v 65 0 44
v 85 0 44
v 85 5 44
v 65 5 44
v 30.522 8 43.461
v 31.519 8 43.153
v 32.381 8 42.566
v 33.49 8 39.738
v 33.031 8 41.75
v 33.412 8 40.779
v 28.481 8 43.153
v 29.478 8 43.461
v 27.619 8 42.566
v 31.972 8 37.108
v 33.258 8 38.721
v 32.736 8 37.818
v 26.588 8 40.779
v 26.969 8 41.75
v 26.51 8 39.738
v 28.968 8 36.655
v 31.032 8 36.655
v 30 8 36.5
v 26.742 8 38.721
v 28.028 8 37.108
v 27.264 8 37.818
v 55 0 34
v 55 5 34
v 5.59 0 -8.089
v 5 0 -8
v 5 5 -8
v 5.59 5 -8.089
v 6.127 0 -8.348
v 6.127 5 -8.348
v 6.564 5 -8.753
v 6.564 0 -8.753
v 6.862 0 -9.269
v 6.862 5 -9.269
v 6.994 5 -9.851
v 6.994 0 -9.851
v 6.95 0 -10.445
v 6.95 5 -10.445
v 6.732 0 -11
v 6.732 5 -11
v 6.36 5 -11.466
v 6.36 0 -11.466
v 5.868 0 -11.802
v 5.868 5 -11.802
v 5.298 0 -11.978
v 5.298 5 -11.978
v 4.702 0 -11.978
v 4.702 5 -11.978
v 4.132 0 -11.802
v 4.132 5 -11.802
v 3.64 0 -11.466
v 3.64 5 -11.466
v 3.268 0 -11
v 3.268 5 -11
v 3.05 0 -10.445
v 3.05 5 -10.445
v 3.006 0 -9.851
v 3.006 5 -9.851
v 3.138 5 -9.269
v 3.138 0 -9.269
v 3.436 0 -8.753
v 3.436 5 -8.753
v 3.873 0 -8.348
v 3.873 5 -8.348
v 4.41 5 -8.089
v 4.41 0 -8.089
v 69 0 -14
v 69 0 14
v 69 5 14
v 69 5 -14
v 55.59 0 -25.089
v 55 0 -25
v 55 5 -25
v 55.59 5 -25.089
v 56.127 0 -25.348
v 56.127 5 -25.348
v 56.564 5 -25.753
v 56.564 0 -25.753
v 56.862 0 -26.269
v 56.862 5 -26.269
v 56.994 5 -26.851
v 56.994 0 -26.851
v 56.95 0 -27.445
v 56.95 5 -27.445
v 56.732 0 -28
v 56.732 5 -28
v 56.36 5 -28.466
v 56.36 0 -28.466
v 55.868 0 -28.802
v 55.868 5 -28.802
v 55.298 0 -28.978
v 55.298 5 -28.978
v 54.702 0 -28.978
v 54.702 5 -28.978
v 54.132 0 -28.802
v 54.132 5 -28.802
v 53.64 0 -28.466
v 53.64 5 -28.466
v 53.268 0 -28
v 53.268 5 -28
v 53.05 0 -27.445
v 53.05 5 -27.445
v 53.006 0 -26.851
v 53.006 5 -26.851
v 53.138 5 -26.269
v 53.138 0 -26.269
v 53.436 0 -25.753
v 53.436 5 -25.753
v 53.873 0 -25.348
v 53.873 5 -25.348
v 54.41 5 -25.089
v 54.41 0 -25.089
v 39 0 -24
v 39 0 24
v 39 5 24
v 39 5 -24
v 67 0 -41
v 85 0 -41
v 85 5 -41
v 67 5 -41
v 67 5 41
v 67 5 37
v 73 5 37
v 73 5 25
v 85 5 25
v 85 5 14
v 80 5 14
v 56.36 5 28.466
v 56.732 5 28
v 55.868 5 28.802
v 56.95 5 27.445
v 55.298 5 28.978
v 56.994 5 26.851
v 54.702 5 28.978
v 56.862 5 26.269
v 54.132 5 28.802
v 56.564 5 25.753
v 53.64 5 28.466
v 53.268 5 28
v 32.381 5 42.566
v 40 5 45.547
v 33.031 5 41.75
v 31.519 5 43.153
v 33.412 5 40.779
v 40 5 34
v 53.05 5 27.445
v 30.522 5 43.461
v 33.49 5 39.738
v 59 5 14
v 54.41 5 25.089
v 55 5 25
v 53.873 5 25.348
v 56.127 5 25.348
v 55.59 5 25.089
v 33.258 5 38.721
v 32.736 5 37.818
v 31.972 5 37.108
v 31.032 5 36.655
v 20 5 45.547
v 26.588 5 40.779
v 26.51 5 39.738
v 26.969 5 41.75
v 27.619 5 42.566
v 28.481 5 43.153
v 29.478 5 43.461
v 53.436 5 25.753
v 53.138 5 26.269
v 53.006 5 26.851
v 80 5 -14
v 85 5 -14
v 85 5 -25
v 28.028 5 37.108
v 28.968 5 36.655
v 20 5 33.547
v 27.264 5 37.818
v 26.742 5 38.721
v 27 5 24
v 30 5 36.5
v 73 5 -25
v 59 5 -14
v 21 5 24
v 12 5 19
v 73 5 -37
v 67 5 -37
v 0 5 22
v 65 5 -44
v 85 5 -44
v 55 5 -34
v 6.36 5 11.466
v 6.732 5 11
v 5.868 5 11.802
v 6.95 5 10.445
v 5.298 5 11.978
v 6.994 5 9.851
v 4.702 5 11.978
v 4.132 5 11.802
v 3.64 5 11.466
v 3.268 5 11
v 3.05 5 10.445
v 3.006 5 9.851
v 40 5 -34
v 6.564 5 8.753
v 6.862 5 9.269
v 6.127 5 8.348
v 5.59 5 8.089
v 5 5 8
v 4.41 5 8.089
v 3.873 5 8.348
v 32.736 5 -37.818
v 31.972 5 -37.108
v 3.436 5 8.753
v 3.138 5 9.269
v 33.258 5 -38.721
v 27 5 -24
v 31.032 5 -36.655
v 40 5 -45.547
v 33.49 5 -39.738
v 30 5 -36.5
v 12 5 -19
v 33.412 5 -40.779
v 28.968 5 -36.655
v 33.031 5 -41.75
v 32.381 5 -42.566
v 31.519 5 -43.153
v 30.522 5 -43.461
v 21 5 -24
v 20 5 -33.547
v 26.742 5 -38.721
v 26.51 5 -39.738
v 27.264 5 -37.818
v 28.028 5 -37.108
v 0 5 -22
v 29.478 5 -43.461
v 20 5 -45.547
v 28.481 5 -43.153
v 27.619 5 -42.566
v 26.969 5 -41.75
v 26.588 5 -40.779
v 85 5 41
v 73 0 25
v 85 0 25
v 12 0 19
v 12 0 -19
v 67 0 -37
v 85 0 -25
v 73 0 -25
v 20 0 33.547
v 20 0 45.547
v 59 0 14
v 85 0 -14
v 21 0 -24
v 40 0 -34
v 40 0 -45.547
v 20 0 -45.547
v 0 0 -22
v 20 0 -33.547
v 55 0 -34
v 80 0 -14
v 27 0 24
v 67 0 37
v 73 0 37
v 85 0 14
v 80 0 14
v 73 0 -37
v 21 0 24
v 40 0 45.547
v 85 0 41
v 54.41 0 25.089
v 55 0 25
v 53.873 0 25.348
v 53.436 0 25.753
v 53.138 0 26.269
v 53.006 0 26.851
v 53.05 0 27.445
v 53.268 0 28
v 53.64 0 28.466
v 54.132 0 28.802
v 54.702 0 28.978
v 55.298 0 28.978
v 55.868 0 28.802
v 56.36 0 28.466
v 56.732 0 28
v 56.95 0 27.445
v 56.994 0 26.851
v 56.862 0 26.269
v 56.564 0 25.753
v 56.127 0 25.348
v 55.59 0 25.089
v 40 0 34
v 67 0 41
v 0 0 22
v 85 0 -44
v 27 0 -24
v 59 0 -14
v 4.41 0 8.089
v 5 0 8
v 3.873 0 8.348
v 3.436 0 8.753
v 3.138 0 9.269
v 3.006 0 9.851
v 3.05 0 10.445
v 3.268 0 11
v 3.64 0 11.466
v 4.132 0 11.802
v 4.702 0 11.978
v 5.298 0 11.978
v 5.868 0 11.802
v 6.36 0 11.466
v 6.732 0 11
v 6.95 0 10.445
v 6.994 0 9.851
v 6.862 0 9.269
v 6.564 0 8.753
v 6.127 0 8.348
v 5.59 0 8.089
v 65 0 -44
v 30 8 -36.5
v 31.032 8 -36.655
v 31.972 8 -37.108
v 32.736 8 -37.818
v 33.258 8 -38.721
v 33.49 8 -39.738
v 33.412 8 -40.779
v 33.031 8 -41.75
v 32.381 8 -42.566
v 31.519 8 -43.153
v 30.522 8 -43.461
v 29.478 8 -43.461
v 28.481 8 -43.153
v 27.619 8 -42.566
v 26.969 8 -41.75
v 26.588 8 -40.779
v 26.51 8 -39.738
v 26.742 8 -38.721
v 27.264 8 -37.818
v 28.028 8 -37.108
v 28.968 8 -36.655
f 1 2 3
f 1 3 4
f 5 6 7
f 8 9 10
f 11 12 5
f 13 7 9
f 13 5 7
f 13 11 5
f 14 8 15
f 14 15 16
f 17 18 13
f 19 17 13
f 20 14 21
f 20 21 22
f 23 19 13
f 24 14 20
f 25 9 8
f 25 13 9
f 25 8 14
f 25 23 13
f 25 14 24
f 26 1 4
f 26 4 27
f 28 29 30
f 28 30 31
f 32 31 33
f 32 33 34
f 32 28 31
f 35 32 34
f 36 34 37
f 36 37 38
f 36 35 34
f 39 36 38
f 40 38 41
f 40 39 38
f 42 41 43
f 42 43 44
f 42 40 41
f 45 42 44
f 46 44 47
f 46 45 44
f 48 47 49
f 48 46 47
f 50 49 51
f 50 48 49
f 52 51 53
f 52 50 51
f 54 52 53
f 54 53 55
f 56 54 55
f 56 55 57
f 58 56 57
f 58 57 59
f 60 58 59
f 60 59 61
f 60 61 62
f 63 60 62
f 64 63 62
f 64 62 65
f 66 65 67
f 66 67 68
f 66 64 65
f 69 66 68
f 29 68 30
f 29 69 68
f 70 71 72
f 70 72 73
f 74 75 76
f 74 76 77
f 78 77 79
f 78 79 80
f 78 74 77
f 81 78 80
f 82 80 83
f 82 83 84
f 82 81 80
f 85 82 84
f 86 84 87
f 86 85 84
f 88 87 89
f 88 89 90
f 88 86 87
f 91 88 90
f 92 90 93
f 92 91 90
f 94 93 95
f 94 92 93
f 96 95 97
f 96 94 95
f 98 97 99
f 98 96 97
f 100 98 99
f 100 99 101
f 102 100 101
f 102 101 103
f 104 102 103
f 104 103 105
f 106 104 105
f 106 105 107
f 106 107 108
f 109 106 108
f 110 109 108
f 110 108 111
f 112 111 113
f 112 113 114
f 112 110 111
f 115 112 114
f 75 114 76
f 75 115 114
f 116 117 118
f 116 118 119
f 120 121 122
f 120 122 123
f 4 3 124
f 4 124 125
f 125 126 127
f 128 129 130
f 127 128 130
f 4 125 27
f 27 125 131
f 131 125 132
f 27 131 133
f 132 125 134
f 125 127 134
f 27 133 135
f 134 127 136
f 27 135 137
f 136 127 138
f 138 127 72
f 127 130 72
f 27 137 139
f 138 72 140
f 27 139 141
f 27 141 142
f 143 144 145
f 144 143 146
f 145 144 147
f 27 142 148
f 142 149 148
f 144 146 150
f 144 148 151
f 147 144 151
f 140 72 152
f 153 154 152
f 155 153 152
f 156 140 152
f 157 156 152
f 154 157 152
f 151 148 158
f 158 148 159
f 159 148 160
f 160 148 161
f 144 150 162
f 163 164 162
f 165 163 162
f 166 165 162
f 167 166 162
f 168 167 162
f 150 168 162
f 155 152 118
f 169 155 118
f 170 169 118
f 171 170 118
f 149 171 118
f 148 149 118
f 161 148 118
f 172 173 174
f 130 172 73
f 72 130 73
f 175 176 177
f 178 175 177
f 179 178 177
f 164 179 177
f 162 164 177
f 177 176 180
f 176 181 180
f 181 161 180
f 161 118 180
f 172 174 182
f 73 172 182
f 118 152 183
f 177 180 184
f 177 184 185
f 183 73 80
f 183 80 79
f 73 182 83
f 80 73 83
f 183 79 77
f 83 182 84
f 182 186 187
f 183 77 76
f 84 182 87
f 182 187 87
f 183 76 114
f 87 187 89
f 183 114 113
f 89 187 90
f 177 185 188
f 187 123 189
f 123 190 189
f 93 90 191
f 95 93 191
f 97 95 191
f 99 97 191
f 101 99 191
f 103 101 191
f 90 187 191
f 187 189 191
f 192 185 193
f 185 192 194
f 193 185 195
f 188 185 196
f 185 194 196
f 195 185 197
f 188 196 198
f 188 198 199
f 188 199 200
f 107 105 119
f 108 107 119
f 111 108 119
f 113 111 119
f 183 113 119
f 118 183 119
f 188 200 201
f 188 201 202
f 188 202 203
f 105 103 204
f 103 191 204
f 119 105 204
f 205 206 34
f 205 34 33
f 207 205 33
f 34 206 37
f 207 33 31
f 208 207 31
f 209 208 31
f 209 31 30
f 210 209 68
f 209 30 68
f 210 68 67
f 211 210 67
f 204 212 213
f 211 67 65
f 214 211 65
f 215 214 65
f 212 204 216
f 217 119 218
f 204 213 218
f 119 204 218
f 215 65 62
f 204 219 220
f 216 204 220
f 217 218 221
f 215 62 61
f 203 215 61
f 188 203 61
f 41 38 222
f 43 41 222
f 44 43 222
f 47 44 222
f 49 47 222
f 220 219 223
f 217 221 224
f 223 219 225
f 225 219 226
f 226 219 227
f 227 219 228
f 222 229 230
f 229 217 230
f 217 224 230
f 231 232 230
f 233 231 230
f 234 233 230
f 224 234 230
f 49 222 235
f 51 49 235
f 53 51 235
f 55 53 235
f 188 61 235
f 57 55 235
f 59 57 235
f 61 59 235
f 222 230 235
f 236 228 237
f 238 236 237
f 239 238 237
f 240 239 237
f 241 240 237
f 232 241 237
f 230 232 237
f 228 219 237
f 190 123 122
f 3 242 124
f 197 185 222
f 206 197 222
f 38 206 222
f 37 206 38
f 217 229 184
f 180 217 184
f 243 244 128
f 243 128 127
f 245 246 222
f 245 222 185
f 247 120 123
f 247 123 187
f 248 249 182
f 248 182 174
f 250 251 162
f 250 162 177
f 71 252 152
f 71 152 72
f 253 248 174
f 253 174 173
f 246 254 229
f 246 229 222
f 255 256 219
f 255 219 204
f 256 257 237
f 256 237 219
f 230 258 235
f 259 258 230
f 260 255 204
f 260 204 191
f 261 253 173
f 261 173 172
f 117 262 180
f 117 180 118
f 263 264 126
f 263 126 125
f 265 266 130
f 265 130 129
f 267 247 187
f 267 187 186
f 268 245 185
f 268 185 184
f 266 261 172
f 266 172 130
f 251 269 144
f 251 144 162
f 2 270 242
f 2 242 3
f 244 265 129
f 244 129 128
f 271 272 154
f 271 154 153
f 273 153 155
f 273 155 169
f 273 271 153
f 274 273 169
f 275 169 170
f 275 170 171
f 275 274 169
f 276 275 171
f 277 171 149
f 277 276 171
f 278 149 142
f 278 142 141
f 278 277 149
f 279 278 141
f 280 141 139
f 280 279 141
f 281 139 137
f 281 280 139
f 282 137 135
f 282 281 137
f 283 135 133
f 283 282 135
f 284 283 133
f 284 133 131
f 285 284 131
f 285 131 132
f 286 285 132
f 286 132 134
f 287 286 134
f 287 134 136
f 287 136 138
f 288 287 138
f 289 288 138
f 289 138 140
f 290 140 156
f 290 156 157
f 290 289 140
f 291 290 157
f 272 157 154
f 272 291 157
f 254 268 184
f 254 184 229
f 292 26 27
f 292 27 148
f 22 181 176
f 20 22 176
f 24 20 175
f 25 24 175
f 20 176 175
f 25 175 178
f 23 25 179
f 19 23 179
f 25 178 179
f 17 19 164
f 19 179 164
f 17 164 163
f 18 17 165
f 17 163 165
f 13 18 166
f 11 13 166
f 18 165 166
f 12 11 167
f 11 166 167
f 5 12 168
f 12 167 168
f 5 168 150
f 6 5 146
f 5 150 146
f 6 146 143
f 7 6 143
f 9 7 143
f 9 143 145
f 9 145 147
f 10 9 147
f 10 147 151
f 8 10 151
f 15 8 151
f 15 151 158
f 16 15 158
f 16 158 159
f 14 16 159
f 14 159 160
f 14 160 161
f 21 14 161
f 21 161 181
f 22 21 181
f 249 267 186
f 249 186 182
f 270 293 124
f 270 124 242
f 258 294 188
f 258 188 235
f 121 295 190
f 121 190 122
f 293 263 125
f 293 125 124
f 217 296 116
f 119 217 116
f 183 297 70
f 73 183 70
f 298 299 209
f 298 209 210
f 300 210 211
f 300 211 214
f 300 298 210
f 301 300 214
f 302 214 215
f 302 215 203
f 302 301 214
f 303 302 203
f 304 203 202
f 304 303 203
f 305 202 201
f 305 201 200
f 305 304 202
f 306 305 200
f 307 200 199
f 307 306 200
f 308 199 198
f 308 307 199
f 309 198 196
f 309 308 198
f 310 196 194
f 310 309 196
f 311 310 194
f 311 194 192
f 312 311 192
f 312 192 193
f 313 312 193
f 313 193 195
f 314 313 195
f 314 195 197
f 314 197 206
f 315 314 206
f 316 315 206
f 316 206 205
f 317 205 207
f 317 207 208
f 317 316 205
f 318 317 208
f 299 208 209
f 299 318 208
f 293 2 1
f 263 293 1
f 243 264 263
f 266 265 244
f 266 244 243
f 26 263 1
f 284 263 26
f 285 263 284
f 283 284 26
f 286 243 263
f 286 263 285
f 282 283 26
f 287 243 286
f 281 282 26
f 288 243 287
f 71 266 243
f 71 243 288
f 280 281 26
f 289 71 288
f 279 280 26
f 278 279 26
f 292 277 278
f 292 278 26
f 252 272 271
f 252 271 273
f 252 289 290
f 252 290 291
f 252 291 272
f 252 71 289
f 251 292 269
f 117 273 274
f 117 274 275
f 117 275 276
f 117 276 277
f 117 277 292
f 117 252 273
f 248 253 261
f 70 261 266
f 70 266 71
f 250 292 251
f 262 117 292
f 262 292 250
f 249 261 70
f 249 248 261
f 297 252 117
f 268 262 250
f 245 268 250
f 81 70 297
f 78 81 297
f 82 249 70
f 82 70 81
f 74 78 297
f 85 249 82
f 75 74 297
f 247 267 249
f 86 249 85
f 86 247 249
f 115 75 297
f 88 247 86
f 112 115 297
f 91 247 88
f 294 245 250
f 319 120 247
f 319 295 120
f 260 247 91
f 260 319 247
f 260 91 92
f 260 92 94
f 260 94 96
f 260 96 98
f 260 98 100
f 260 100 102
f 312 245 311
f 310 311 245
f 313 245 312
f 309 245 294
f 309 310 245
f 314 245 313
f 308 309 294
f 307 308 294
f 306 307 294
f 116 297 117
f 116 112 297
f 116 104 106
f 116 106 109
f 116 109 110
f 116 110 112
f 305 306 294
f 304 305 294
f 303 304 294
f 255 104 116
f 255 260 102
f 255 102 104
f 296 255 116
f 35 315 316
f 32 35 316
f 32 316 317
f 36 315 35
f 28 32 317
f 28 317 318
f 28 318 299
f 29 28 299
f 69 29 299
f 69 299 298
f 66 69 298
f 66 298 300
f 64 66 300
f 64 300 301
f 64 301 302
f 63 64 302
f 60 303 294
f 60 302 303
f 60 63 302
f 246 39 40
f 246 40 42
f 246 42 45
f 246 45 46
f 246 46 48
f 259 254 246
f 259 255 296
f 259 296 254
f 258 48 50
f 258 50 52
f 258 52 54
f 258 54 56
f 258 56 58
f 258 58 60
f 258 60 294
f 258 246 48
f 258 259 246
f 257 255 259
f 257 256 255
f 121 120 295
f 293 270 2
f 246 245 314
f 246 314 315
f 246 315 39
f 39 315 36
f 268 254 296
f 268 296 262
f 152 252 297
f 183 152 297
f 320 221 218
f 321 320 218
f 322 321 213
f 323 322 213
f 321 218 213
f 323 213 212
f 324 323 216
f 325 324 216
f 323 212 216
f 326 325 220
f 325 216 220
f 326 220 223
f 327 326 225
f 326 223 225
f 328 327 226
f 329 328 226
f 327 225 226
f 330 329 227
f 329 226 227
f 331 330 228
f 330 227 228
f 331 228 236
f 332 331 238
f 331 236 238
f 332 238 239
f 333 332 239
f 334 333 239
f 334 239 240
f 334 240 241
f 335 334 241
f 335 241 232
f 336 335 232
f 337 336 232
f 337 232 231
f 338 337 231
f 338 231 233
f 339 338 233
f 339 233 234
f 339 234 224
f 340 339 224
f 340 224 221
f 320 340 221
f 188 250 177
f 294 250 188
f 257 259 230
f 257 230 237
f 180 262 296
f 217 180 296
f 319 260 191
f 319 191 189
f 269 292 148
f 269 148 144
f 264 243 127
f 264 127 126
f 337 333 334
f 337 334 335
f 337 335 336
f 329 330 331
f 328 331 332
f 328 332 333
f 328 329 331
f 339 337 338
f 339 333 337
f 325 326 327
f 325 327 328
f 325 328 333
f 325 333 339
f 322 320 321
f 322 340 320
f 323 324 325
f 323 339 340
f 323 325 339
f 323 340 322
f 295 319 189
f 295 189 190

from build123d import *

# Parameters (mm, degrees)
SKETCH3_R           = 2
SKETCH3_R_2         = 3.5
SKETCH3_W           = 12
SKETCH3_H           = 48
SKETCH3_W_2         = 10
SKETCH3_H_2         = 28
BOSS_EXTRUDE1_DEPTH = 5
SKETCH3_2_R         = 3.5
BOSS_EXTRUDE2_DEPTH = 8


with BuildPart() as part:
    # Sketch3 → Boss-Extrude1 (new body)
    with BuildSketch(Plane(origin=(0, 0, 0), x_dir=(1, 0, 0), z_dir=(0, 1, 0))):
        Polygon((0, -22), (0, 22), (20, 33.547005384), (20, 45.547005384), (40, 45.547005384), (40, 34), (55, 34), (65, 44), (85, 44), (85, 41), (67, 41), (67, 37), (73, 37), (73, 25), (85, 25), (85, 14), (80, 14), (80, -14), (85, -14), (85, -25), (73, -25), (73, -37), (67, -37), (67, -41), (85, -41), (85, -44), (65, -44), (55, -34), (40, -34), (40, -45.547005384), (20, -45.547005384), (20, -33.547005384), align=None)
        with Locations((55, 27)):
            Circle(SKETCH3_R, mode=Mode.SUBTRACT)
        with Locations((30, 40)):
            Circle(SKETCH3_R_2, mode=Mode.SUBTRACT)
        with Locations((5, 10)):
            Circle(SKETCH3_R, mode=Mode.SUBTRACT)
        with Locations((5, -10)):
            Circle(SKETCH3_R, mode=Mode.SUBTRACT)
        with Locations((30, -40)):
            Circle(SKETCH3_R_2, mode=Mode.SUBTRACT)
        with Locations((55, -27)):
            Circle(SKETCH3_R, mode=Mode.SUBTRACT)
        with Locations((33, 0)):
            Rectangle(SKETCH3_W, SKETCH3_H, mode=Mode.SUBTRACT)
        with Locations((64, 0)):
            Rectangle(SKETCH3_W_2, SKETCH3_H_2, mode=Mode.SUBTRACT)
        Polygon((12, 19), (12, -19), (21, -24), (21, 24), align=None, mode=Mode.SUBTRACT)
    extrude(amount=BOSS_EXTRUDE1_DEPTH)

    # Sketch3<2> → Boss-Extrude2 (add)
    with BuildSketch(Plane(origin=(0, 0, 0), x_dir=(1, 0, 0), z_dir=(0, 1, 0))):
        with Locations((30, 40)):
            Circle(SKETCH3_2_R)
        with Locations((30, -40)):
            Circle(SKETCH3_2_R)
    extrude(amount=BOSS_EXTRUDE2_DEPTH)


solid = part.part
